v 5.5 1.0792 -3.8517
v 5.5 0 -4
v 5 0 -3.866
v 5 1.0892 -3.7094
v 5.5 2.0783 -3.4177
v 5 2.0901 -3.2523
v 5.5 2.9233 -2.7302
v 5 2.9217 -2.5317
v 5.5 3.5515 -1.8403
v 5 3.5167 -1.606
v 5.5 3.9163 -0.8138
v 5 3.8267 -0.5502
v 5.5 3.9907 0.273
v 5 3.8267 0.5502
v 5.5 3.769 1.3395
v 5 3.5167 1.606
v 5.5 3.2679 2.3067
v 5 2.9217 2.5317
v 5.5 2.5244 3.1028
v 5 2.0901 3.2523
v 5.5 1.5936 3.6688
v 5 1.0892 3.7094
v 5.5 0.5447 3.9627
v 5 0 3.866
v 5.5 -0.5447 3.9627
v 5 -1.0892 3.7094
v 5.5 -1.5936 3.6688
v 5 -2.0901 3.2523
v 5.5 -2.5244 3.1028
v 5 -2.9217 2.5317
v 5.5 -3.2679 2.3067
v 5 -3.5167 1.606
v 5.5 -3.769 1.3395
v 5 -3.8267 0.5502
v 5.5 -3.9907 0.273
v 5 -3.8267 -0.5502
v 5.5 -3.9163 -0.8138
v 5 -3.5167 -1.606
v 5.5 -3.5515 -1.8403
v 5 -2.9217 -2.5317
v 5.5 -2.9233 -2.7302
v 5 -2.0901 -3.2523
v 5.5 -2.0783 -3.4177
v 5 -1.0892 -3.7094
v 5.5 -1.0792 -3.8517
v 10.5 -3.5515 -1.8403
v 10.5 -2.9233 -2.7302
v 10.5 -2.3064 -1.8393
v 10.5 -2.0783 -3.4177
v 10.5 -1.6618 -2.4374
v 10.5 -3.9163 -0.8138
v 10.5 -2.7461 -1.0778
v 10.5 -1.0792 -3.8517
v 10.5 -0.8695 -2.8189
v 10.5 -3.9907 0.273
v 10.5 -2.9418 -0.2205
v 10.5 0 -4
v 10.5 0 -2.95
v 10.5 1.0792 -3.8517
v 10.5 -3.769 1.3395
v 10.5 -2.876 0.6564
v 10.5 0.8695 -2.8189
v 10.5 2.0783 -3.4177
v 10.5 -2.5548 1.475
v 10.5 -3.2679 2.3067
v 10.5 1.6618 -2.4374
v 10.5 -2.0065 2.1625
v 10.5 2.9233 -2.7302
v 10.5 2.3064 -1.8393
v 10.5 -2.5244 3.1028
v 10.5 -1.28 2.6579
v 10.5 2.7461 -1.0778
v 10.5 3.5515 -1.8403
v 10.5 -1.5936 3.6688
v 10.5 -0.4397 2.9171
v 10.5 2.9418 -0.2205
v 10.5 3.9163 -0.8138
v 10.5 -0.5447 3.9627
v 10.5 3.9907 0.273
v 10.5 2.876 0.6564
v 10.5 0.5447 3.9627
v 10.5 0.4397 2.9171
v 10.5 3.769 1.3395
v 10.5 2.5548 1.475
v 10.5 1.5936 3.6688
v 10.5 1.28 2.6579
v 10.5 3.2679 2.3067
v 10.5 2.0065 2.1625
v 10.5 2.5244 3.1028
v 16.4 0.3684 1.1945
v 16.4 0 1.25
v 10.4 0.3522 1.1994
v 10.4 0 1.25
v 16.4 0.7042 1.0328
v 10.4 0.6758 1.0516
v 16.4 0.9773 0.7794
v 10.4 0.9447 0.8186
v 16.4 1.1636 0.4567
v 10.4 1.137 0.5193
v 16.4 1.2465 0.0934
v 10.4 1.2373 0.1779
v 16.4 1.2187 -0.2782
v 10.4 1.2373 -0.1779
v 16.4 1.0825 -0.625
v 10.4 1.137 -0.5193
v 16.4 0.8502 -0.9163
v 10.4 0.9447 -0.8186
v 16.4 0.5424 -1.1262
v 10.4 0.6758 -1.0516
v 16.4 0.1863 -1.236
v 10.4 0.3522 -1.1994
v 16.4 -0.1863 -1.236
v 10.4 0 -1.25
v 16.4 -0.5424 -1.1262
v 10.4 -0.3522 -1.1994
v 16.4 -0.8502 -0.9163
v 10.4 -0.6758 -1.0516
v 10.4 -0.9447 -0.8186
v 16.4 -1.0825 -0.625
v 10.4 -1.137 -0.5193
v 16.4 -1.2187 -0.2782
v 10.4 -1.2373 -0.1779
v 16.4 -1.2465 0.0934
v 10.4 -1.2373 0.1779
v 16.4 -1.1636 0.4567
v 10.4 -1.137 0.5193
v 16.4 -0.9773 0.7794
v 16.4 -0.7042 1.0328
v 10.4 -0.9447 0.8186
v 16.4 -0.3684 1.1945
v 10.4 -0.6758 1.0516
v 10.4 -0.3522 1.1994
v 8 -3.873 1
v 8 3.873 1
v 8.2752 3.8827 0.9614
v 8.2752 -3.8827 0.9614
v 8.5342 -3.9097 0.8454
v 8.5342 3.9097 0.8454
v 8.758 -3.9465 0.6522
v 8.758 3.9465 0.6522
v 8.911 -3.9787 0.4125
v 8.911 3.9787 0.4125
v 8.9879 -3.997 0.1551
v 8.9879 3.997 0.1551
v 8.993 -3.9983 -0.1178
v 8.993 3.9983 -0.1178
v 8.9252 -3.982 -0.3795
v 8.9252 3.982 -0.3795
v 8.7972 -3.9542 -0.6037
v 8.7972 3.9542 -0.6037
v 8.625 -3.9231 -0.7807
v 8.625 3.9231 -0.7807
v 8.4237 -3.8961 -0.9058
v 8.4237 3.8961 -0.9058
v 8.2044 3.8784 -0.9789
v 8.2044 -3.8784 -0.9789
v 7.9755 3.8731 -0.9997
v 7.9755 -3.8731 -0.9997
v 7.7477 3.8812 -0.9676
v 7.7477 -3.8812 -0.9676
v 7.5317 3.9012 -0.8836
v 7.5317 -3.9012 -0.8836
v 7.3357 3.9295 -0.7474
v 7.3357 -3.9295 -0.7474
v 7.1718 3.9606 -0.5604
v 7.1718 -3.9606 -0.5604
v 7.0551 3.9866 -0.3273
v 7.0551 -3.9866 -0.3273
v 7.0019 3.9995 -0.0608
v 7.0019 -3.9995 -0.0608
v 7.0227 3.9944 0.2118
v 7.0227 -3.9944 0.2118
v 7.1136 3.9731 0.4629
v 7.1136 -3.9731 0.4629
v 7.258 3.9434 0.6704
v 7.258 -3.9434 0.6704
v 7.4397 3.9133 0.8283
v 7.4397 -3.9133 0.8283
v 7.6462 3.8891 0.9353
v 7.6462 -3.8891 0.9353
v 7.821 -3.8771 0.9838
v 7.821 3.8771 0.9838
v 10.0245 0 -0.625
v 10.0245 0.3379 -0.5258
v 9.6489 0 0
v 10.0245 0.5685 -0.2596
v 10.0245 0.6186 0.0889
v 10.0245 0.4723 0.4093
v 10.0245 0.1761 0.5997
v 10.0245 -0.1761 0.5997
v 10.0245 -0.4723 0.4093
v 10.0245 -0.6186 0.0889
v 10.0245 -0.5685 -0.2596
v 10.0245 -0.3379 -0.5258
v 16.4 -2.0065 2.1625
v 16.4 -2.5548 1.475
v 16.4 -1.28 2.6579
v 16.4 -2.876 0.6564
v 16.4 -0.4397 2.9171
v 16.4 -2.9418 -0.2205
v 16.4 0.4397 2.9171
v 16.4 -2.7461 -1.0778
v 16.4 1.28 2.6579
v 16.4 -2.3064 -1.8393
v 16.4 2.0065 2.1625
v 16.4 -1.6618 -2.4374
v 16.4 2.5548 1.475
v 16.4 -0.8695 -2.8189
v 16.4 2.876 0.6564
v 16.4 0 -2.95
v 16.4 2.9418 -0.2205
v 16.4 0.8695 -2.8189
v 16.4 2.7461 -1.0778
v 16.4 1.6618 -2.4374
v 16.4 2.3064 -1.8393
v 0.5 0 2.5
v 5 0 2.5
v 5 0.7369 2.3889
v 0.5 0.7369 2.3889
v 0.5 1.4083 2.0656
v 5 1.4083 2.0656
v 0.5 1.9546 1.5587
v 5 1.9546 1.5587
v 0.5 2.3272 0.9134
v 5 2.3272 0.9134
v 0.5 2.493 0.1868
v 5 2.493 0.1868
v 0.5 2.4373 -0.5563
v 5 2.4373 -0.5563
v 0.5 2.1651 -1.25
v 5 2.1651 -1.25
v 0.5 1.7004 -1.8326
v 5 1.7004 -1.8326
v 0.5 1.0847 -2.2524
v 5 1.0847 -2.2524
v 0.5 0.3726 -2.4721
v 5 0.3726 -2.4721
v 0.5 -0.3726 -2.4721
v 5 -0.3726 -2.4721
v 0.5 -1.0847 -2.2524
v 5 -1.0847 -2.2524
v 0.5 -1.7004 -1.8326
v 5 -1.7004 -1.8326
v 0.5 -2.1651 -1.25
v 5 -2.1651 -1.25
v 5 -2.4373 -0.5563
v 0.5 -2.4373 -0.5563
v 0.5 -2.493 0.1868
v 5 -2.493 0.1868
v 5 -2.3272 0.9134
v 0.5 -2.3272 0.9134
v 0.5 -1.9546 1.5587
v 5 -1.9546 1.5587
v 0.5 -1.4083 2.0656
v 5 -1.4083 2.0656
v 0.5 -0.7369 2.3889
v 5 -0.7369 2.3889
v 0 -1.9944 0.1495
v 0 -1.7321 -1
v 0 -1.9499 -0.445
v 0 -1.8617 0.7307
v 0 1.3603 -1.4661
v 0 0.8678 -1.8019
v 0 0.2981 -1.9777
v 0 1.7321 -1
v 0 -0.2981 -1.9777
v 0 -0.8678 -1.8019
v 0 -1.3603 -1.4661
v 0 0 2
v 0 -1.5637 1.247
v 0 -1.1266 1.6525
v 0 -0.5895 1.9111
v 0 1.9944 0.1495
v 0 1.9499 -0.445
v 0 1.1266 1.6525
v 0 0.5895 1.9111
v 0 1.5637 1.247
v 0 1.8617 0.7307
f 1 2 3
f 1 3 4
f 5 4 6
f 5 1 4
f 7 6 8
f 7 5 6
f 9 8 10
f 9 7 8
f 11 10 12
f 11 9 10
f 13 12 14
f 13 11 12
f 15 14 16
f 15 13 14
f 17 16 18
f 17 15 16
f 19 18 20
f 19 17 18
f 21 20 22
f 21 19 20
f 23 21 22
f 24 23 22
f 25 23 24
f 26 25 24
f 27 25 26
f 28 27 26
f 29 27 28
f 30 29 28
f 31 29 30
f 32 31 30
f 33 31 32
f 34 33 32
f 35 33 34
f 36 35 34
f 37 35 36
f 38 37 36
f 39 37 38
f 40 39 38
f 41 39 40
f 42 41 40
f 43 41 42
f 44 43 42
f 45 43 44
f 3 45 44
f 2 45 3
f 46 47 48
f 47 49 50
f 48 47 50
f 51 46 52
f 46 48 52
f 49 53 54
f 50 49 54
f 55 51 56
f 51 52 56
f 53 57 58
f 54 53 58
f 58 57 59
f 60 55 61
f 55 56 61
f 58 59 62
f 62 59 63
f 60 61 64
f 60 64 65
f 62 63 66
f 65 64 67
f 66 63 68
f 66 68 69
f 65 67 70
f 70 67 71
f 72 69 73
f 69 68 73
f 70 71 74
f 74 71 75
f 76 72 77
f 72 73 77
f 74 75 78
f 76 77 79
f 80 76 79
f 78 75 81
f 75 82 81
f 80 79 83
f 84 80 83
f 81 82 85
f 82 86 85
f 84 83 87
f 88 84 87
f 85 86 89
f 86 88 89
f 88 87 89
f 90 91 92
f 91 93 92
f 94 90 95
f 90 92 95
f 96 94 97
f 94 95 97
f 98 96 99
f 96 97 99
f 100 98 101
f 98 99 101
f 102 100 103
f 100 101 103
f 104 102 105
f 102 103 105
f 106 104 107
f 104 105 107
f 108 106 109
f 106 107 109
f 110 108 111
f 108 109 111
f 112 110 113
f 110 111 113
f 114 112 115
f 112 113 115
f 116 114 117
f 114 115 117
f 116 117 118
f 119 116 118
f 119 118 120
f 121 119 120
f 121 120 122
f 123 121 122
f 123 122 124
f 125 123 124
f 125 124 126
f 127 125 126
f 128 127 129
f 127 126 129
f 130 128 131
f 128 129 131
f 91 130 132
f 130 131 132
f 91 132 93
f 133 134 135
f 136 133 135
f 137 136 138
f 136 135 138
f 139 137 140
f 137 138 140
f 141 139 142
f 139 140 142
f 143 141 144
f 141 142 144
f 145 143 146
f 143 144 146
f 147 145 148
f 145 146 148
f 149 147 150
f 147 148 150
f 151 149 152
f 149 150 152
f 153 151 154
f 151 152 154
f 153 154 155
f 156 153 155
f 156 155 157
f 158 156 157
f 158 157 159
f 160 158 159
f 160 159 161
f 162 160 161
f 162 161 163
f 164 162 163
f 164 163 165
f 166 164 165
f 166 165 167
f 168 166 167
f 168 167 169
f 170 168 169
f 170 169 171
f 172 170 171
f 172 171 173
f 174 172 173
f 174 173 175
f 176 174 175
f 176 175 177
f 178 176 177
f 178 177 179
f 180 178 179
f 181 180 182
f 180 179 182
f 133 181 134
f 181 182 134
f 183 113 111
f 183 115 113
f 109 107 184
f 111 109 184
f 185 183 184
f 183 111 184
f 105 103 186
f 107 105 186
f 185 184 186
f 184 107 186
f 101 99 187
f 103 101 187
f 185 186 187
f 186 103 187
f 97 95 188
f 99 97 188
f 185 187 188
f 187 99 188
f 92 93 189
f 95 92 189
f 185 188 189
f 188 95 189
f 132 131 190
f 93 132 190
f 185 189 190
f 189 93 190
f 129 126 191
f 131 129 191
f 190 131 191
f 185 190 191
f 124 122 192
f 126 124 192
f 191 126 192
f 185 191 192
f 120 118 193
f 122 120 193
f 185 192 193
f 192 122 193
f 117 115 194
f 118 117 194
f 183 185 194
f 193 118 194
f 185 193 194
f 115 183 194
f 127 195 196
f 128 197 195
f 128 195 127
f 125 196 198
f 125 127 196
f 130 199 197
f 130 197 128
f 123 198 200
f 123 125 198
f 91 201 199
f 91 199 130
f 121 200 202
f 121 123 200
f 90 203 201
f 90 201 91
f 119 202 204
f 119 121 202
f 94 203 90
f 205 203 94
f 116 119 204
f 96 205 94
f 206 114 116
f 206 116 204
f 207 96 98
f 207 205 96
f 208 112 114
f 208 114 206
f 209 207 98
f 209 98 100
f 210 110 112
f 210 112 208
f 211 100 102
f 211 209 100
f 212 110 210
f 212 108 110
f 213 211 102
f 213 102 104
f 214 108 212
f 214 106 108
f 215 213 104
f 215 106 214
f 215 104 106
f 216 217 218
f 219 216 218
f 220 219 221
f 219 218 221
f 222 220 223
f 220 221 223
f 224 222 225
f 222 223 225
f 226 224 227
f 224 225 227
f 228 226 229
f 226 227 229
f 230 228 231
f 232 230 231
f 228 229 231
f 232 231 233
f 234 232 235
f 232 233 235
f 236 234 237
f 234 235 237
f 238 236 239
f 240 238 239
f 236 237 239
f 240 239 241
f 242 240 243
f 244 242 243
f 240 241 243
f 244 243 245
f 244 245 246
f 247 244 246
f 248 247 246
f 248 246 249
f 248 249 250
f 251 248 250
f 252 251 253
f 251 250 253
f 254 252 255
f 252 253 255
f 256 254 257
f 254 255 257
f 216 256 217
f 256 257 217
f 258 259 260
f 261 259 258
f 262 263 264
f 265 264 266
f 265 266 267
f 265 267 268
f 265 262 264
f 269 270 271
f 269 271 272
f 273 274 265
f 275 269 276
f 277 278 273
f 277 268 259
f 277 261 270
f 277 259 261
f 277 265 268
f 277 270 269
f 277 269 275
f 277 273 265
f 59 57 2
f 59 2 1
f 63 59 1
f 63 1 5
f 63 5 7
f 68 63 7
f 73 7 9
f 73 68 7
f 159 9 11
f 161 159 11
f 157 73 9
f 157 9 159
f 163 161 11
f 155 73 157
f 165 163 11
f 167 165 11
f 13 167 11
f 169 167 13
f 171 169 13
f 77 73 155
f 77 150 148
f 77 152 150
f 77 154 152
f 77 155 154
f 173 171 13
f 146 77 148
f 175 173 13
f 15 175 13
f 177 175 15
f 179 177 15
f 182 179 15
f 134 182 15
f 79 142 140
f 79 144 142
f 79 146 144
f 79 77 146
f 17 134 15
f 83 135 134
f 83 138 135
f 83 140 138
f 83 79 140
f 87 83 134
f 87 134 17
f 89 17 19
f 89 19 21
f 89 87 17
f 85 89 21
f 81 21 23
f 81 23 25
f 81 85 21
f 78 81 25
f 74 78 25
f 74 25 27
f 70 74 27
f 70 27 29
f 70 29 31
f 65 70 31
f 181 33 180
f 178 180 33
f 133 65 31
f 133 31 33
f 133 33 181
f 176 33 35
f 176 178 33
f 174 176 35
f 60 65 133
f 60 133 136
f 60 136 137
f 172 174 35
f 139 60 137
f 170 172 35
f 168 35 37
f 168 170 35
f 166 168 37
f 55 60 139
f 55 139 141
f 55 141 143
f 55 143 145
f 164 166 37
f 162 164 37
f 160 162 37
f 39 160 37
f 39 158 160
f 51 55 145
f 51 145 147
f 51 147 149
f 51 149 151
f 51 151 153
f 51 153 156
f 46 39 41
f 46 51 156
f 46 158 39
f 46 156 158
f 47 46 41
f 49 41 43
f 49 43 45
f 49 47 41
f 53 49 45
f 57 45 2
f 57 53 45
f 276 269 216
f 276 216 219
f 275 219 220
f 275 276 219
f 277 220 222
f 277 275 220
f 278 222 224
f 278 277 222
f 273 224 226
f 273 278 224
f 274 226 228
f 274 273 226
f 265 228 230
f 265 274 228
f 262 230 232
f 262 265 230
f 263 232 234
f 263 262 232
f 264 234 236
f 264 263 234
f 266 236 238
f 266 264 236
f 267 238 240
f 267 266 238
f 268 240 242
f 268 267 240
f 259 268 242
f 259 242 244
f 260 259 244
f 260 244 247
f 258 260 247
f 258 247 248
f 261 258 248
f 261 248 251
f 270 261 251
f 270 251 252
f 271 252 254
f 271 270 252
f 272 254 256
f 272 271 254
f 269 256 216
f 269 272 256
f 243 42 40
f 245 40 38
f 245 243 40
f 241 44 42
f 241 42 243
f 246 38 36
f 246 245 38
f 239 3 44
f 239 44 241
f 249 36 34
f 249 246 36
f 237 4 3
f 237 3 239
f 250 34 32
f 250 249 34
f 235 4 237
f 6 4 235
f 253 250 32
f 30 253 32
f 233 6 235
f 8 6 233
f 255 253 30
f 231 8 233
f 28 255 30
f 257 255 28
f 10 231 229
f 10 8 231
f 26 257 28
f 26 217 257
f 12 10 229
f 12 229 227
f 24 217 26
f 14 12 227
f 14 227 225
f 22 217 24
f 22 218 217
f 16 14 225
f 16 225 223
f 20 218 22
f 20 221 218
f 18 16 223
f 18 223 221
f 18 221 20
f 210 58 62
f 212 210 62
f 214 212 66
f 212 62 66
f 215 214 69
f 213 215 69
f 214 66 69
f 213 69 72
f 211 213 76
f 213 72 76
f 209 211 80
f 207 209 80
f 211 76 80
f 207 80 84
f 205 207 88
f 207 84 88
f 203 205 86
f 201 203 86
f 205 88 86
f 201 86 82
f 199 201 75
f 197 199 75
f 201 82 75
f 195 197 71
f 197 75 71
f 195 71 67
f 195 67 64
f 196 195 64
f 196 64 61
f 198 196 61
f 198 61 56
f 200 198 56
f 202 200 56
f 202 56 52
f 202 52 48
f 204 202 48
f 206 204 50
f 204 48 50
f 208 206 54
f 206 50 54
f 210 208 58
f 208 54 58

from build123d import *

# Parameters (mm, degrees)
SKETCH1_W                       = 5.5
SKETCH1_H                       = 4
SKETCH2_R                       = 2.5
BOSS_EXTRUDE1_DEPTH             = 5
SKETCH3_R                       = 2.95
BOSS_EXTRUDE2_DEPTH             = 5.9
F_2_0_2_DIAMETER_HOLE1_D        = 2
TAP_DRILL_FOR_M3X0_5_TAP1_D     = 2.5
TAP_DRILL_FOR_M3X0_5_TAP1_DEPTH = 6
TAP_DRILL_FOR_M3X0_5_TAP1_TIP   = 0.751075774
CHAMFER1_SIZE                   = 0.5
CHAMFER2_SIZE                   = 0.133974596
CHAMFER2_SIZE2                  = 0.5


with BuildPart() as part:
    # Sketch1 → Revolve1 (revolve)
    with BuildSketch(Plane.XY, mode=Mode.PRIVATE) as revolve1_sk:
        with Locations((7.75, 2)):
            Rectangle(SKETCH1_W, SKETCH1_H)
    revolve(revolve1_sk.sketch.rotate(Axis((5, 0, 0), (1, 0, 0)), 270), axis=Axis((5, 0, 0), (1, 0, 0)))

    # Sketch2 → Boss-Extrude1 (add)
    with BuildSketch(Plane.ZY.offset(-5)):
        Circle(SKETCH2_R)
    extrude(amount=BOSS_EXTRUDE1_DEPTH)

    # Sketch3 → Boss-Extrude2 (add)
    with BuildSketch(Plane(origin=(10.5, 0, 0), x_dir=(0, 0, -1), z_dir=(1, 0, 0))):
        Circle(SKETCH3_R)
    extrude(amount=BOSS_EXTRUDE2_DEPTH)

    # Ø2.0 (2) Diameter Hole1 (through all)
    with Locations(Plane(origin=(8, -4, 0), x_dir=(0, 0, -1), z_dir=(0, -1, 0))):
        with Locations((0, 0)):
            Hole(F_2_0_2_DIAMETER_HOLE1_D / 2)

    # Tap Drill for M3x0.5 Tap1
    with Locations(Plane(origin=(16.4, 0, 0), x_dir=(0, 0, -1), z_dir=(1, 0, 0))):
        with Locations((0, 0)):
            Hole(TAP_DRILL_FOR_M3X0_5_TAP1_D / 2, depth=TAP_DRILL_FOR_M3X0_5_TAP1_DEPTH)
            with Locations((0, 0, -(TAP_DRILL_FOR_M3X0_5_TAP1_DEPTH + TAP_DRILL_FOR_M3X0_5_TAP1_TIP / 2))):  # 118° drill point
                Cone(0, TAP_DRILL_FOR_M3X0_5_TAP1_D / 2, TAP_DRILL_FOR_M3X0_5_TAP1_TIP, mode=Mode.SUBTRACT)

    # Chamfer1
    chamfer1_edges = [part.edges().sort_by_distance(p)[0] for p in [
        (0, 0, -2.5),
    ]]
    chamfer(chamfer1_edges, length=CHAMFER1_SIZE)

    # Chamfer2
    chamfer2_edges = [part.edges().sort_by_distance(p)[0] for p in [
        (5, 0, 4),
    ]]
    chamfer2_side = [part.faces().sort_by_distance(p)[0] for p in [
        (5, 0, 3.886862915),
    ]]
    chamfer(chamfer2_edges, length=CHAMFER2_SIZE, length2=CHAMFER2_SIZE2, reference=chamfer2_side[0])


solid = part.part
